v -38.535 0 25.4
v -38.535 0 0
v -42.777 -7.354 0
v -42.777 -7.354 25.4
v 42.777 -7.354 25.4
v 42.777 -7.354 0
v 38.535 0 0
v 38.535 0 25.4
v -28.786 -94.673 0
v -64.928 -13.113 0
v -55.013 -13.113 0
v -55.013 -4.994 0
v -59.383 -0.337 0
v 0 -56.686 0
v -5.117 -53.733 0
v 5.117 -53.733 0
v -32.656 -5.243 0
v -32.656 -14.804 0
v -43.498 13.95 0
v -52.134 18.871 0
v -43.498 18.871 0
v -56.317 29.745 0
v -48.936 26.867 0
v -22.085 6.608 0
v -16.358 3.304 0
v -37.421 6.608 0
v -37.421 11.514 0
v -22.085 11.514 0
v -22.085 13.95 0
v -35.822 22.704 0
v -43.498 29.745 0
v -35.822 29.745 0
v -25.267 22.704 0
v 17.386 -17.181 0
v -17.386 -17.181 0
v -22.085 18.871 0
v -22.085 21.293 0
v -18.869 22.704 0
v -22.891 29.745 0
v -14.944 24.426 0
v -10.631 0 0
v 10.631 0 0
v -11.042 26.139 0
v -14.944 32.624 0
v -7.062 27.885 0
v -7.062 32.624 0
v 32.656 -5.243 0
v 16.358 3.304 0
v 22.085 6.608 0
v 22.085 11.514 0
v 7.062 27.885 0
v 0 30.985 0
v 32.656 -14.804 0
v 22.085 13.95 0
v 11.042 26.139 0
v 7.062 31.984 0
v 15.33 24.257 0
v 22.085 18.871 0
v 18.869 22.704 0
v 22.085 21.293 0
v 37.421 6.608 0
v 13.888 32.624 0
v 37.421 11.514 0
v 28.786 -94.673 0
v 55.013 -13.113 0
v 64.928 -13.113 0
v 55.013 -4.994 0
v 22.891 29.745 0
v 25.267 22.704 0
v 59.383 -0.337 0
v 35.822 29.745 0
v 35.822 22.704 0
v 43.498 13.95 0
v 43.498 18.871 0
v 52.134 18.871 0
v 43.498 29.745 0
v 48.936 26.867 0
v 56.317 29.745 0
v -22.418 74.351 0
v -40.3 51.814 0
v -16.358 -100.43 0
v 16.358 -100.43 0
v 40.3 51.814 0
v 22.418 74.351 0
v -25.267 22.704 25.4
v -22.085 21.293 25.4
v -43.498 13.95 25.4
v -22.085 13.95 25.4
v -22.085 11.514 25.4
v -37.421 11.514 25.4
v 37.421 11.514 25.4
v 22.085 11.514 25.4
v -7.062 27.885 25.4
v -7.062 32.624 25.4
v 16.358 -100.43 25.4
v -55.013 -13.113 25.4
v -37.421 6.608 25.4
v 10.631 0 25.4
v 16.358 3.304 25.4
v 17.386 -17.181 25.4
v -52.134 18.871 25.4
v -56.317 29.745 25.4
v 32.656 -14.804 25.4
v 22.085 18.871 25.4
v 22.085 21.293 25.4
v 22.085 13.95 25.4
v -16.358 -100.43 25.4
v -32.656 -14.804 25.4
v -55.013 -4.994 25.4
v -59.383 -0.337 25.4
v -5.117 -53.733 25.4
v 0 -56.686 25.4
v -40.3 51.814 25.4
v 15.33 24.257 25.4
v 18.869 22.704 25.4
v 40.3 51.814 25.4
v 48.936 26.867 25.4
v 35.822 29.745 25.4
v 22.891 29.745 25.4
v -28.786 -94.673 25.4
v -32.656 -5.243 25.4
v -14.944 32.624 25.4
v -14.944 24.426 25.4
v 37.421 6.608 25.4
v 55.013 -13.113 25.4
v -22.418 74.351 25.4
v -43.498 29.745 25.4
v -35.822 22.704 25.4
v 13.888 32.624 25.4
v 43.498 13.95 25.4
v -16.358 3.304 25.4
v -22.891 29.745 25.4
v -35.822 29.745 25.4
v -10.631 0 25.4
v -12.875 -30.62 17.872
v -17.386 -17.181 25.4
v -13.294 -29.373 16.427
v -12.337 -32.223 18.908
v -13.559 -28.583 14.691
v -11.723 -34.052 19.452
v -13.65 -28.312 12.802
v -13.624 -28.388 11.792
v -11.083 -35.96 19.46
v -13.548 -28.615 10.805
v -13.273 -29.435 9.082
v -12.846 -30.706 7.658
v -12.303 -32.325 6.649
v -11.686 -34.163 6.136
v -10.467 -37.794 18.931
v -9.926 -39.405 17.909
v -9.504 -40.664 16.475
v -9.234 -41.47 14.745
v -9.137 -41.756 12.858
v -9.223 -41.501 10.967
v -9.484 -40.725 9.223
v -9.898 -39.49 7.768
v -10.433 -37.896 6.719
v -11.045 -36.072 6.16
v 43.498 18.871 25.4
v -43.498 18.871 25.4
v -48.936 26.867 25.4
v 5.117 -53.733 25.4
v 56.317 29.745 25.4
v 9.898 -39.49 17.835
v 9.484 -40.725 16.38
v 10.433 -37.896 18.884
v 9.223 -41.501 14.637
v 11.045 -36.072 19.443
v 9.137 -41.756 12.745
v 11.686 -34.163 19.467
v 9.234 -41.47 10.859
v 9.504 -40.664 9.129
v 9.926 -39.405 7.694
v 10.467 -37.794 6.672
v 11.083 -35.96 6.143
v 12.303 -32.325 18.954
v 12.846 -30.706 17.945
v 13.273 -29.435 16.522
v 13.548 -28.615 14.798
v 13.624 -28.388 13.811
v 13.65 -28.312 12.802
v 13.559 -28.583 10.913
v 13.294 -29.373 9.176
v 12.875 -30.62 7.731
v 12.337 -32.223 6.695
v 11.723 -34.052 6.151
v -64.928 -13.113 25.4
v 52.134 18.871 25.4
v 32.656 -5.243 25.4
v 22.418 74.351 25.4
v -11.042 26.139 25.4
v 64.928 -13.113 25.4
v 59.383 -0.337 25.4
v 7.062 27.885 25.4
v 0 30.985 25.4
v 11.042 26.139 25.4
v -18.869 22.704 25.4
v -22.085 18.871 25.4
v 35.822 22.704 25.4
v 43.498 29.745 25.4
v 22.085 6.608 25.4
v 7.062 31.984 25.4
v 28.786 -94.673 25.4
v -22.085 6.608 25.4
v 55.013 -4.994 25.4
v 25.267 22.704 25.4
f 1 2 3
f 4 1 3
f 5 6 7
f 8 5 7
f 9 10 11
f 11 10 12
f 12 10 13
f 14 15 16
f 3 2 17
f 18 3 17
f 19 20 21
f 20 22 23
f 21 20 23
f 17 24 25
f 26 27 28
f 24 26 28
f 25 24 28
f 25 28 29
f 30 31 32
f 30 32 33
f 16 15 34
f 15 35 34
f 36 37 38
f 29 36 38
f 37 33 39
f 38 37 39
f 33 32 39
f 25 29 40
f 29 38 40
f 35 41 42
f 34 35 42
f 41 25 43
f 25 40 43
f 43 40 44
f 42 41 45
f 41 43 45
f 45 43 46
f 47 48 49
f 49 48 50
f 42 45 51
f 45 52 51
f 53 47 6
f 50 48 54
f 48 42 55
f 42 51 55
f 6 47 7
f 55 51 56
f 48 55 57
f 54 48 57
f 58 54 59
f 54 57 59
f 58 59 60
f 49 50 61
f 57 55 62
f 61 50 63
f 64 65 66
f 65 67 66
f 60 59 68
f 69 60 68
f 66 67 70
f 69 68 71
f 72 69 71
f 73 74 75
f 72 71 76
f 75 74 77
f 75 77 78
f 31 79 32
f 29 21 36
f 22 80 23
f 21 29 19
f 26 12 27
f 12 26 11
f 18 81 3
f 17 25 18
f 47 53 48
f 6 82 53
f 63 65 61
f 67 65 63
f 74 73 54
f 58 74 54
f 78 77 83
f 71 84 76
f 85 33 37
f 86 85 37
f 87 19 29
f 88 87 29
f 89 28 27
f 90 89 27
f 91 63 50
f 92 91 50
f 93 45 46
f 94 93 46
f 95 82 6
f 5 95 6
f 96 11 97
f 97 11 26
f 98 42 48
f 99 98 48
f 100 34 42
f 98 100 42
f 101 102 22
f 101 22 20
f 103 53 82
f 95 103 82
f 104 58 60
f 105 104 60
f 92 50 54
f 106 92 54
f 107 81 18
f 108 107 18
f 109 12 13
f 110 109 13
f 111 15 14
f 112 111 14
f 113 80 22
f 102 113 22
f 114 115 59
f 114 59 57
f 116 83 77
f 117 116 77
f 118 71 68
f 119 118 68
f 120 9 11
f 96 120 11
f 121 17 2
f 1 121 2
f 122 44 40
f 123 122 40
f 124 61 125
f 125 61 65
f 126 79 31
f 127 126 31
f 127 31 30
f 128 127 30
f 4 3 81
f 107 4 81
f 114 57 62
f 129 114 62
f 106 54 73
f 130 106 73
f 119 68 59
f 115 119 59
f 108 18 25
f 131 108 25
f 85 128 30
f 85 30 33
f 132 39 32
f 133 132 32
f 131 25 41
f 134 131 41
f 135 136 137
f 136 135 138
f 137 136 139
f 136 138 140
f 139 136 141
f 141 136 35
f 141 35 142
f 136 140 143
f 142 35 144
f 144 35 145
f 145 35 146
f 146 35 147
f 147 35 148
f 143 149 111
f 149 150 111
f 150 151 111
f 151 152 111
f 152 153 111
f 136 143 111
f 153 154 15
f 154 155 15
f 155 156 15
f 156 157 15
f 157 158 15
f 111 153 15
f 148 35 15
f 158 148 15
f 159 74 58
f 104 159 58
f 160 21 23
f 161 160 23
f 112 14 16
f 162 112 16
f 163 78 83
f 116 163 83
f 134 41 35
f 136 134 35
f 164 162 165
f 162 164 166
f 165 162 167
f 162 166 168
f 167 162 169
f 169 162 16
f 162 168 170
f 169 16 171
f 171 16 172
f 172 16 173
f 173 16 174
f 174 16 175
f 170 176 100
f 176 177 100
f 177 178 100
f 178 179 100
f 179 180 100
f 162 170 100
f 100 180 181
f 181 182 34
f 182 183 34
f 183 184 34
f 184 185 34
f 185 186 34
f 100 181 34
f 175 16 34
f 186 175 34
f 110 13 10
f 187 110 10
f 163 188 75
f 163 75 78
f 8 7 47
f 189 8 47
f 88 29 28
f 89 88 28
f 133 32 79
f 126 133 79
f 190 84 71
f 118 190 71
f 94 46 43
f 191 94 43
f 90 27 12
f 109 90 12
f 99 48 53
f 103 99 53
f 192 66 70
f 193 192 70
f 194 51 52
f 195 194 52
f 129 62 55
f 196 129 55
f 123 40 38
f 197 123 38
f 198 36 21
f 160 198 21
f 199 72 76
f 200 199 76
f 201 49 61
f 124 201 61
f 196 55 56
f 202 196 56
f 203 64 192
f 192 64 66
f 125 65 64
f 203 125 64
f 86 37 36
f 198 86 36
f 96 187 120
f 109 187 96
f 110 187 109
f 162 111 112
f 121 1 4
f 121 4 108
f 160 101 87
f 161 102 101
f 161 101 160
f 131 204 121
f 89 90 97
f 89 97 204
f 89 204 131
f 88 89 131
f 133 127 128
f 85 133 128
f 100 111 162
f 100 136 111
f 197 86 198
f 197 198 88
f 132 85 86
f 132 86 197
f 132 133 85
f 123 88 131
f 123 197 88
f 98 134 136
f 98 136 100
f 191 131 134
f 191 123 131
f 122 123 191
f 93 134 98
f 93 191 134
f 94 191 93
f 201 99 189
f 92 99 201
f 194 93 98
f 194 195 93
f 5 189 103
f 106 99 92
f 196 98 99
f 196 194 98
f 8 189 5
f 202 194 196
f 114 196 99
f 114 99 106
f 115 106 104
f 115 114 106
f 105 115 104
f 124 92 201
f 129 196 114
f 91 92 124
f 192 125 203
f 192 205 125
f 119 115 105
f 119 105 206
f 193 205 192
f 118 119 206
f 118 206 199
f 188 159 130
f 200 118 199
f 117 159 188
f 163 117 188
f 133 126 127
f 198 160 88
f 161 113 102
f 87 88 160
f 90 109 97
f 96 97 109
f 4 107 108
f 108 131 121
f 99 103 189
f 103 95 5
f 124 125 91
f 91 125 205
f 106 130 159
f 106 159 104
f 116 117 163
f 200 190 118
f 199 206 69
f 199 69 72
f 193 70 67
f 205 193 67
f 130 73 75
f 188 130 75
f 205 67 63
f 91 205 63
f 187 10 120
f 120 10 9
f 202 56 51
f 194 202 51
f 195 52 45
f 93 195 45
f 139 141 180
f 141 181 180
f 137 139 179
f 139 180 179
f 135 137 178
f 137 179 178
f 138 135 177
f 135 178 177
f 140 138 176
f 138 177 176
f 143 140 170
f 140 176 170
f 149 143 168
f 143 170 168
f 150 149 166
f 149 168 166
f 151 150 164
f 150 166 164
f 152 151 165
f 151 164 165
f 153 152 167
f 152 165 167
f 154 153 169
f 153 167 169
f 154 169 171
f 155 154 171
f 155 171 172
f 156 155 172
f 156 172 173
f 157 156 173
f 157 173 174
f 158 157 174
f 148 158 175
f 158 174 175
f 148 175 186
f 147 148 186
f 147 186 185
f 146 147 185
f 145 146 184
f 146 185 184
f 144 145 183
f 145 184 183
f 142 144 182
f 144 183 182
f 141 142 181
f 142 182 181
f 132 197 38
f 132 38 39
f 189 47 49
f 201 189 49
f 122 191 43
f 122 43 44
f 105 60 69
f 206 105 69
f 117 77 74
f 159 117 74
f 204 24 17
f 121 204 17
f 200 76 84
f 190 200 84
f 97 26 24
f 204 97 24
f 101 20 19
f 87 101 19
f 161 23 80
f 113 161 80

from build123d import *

# Parameters (mm, degrees)
F1_DEPTH = 25.4
F2_R     = 6.722416
F3_DEPTH = 19.304


with BuildPart() as f1:
    # F0 (on Top) → F1 (new body)
    with BuildSketch(Plane.XY):
        Polygon((-22.084782, 21.292763), (-18.868631, 22.704166), (-22.891159, 29.745255), (-35.822235, 29.745255), (-22.417855, 74.350529), (-43.49843, 29.745255), (-35.822235, 22.704166), (-25.267471, 22.704166), align=None)
        Polygon((-22.084782, 13.950433), (-22.084782, 18.870648), (-43.49843, 18.870648), (-48.935734, 26.866684), (-40.300015, 51.81431), (-56.316686, 29.745255), (-52.134149, 18.870648), (-43.49843, 13.950433), align=None)
        Polygon((-22.084782, 6.608103), (-22.084782, 11.514296), (-37.421443, 11.514296), (-55.012722, -4.994443), (-59.383125, -0.337456), (-64.927801, -13.113492), (-28.785726, -94.673045), (-55.012722, -13.113492), (-37.421443, 6.608103), align=None)
        Polygon((-16.357765, 3.304051), (-22.084782, 6.608103), (-32.656161, -5.243477), (-38.534627, 0), (-42.777374, -7.354087), (-16.357765, -100.430191), (-32.656161, -14.804116), align=None)
        Polygon((-14.944169, 24.426411), (-11.042391, 26.138701), (-14.944169, 32.623827), align=None)
        Polygon((7.062444, 31.984143), (7.062444, 27.885296), (11.042391, 26.138701), align=None)
        Polygon((7.062444, 27.885296), (0, 30.98464), (-7.062444, 27.885296), (-11.042391, 26.138701), (-14.944169, 24.426411), (-18.868631, 22.704166), (-22.084782, 21.292763), (-22.084782, 18.870648), (-22.084782, 13.950433), (-22.084782, 11.514296), (-22.084782, 6.608103), (-16.357765, 3.304051), (-10.630748, 0), (-17.385691, -17.181048), (-5.11746, -53.733349), (0, -56.685733), (5.11746, -53.733349), (17.385691, -17.181048), (10.630748, 0), (16.357765, 3.304051), (22.084782, 6.608103), (22.084782, 11.514296), (22.084782, 13.950433), (22.084782, 18.870648), (22.084782, 21.292763), (18.868631, 22.704166), (15.330053, 24.257066), (11.042391, 26.138701), align=None)
        Polygon((-11.042391, 26.138701), (-7.062444, 27.885296), (-7.062444, 32.623827), align=None)
        Polygon((13.88838, 32.623827), (11.042391, 26.138701), (15.330053, 24.257066), align=None)
        Polygon((22.891159, 29.745255), (18.868631, 22.704166), (22.084782, 21.292763), (25.267471, 22.704166), (35.822235, 22.704166), (43.49843, 29.745255), (22.417855, 74.350529), (35.822235, 29.745255), align=None)
        Polygon((43.49843, 18.870648), (22.084782, 18.870648), (22.084782, 13.950433), (43.49843, 13.950433), (52.134149, 18.870648), (56.316686, 29.745255), (40.300015, 51.81431), (48.935734, 26.866684), align=None)
        Polygon((37.421443, 11.514296), (22.084782, 11.514296), (22.084782, 6.608103), (37.421443, 6.608103), (55.012722, -13.113492), (28.785726, -94.673045), (64.927801, -13.113492), (59.383125, -0.337456), (55.012722, -4.994443), align=None)
        Polygon((32.656161, -5.243477), (22.084782, 6.608103), (16.357765, 3.304051), (32.656161, -14.804116), (16.357765, -100.430191), (42.777374, -7.354087), (38.534627, 0), align=None)
    extrude(amount=F1_DEPTH)

    # F2 (on Right) → F3 (cut, symmetric)
    with BuildSketch(Plane.YZ):
        with Locations((-35.03409, 12.8016)):
            Circle(F2_R)
    extrude(amount=F3_DEPTH, both=True, mode=Mode.SUBTRACT)


solid = f1.part
